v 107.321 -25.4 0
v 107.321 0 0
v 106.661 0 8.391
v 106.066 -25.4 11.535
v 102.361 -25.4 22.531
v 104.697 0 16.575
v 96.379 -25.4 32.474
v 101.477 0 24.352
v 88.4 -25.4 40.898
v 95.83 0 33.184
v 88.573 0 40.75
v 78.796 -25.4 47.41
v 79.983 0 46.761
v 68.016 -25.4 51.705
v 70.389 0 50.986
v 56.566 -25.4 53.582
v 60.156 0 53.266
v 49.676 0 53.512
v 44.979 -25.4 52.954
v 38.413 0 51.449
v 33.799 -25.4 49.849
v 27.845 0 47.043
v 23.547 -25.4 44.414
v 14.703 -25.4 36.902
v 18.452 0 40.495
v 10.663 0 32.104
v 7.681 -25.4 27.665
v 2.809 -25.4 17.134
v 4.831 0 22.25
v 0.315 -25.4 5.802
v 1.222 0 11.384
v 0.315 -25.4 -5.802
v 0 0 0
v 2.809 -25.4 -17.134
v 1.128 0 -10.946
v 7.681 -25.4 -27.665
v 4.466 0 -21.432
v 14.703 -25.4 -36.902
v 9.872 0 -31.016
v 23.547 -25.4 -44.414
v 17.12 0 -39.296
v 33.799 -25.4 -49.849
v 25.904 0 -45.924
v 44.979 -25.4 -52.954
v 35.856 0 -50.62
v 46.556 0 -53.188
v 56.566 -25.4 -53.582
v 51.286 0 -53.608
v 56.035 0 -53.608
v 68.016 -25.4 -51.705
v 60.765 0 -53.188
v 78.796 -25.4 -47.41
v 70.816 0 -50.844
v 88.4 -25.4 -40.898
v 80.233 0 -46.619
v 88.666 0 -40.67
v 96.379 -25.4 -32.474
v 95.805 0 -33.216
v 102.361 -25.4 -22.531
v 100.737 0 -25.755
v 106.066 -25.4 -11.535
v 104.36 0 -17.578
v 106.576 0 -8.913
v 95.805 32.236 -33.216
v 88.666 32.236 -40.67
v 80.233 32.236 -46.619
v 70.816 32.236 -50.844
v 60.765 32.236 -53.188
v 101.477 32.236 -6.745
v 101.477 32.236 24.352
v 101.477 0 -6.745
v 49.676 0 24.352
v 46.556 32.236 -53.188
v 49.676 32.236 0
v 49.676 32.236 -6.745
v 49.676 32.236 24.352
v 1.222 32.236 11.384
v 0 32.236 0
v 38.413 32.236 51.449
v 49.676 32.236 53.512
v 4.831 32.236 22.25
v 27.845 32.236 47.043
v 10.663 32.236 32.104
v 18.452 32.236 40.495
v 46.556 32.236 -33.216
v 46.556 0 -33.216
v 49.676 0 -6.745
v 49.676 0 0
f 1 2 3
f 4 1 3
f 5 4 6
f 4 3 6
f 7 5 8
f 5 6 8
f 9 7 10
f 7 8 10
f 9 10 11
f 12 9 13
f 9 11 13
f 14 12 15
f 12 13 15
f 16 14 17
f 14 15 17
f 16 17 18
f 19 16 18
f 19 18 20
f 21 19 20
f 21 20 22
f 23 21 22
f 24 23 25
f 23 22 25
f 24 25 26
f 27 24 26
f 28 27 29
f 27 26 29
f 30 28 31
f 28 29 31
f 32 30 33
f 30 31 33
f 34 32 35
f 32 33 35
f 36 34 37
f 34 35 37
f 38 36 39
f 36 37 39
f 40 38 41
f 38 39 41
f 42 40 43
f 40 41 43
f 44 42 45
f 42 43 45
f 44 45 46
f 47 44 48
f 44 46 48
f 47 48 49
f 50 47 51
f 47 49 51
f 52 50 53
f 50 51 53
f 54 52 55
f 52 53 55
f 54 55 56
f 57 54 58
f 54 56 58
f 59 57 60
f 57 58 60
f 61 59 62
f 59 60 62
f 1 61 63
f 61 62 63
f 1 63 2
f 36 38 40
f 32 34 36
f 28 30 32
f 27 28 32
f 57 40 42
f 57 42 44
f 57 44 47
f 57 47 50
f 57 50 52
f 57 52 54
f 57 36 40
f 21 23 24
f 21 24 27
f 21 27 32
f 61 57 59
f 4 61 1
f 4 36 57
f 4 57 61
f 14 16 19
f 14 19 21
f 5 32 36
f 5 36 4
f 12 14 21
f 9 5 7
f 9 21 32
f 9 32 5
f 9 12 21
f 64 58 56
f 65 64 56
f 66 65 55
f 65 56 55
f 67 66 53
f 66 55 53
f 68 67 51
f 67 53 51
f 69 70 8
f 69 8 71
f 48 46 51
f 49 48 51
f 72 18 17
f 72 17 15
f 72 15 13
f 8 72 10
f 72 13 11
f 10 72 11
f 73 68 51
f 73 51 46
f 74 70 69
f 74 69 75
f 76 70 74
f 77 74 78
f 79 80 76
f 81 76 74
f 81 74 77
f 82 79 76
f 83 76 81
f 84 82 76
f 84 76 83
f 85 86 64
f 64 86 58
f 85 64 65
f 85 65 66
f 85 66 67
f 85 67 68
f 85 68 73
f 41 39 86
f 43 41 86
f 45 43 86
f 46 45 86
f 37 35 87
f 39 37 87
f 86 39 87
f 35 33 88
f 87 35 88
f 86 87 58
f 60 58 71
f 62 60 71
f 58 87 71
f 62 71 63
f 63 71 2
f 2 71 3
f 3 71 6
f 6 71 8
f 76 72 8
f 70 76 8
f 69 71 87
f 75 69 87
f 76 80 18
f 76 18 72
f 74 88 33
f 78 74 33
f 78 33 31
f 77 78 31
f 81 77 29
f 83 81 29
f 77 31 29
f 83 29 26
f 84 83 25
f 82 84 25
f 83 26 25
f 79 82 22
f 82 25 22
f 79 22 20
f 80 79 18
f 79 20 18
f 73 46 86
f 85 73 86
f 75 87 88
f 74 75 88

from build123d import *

# Parameters (mm, degrees)
F0_R     = 53.6605194211
F1_DEPTH = 25.4
F3_DEPTH = 32.2364754975


with BuildPart() as f1:
    # F0 (on Front) → F1 (new body)
    with BuildSketch(Plane.XZ):
        with Locations((53.6605194211, 0)):
            Circle(F0_R)
    extrude(amount=F1_DEPTH)

    # F2 (on face) → F3 (join)
    with BuildSketch(Plane(origin=(0, 0, 0), x_dir=(-1, 0, 0), z_dir=(0, 1, 0))):
        with BuildLine():
            Line((-49.6755093336, 24.3517733055), (-49.6755093336, 0))
            Line((-49.6755093336, 0), (0, 0))
            ThreePointArc((0, 0), (-14.3331176779, 36.5076268289), (-49.6755093336, 53.512344736))
            Line((-49.6755093336, 53.512344736), (-49.6755093336, 24.3517733055))
        make_face()
        Polygon((-101.477278841, -6.7454725504), (-49.6755093336, -6.7454725504), (-49.6755093336, 0), (-49.6755093336, 24.3517733055), (-101.477278841, 24.3517733055), align=None)
        with BuildLine():
            Line((-46.5558620227, -33.2158250568), (-49.6755093336, -33.2158250568))
            Line((-49.6755093336, -33.2158250568), (-95.8050363876, -33.2158250568))
            ThreePointArc((-95.8050363876, -33.2158250568), (-80.2329364873, -46.6192878088), (-60.7651768195, -53.1881113388))
            Line((-60.7651768195, -53.1881113388), (-46.5558620227, -53.1881113388))
            Line((-46.5558620227, -53.1881113388), (-46.5558620227, -33.2158250568))
        make_face()
    extrude(amount=F3_DEPTH)


solid = f1.part
